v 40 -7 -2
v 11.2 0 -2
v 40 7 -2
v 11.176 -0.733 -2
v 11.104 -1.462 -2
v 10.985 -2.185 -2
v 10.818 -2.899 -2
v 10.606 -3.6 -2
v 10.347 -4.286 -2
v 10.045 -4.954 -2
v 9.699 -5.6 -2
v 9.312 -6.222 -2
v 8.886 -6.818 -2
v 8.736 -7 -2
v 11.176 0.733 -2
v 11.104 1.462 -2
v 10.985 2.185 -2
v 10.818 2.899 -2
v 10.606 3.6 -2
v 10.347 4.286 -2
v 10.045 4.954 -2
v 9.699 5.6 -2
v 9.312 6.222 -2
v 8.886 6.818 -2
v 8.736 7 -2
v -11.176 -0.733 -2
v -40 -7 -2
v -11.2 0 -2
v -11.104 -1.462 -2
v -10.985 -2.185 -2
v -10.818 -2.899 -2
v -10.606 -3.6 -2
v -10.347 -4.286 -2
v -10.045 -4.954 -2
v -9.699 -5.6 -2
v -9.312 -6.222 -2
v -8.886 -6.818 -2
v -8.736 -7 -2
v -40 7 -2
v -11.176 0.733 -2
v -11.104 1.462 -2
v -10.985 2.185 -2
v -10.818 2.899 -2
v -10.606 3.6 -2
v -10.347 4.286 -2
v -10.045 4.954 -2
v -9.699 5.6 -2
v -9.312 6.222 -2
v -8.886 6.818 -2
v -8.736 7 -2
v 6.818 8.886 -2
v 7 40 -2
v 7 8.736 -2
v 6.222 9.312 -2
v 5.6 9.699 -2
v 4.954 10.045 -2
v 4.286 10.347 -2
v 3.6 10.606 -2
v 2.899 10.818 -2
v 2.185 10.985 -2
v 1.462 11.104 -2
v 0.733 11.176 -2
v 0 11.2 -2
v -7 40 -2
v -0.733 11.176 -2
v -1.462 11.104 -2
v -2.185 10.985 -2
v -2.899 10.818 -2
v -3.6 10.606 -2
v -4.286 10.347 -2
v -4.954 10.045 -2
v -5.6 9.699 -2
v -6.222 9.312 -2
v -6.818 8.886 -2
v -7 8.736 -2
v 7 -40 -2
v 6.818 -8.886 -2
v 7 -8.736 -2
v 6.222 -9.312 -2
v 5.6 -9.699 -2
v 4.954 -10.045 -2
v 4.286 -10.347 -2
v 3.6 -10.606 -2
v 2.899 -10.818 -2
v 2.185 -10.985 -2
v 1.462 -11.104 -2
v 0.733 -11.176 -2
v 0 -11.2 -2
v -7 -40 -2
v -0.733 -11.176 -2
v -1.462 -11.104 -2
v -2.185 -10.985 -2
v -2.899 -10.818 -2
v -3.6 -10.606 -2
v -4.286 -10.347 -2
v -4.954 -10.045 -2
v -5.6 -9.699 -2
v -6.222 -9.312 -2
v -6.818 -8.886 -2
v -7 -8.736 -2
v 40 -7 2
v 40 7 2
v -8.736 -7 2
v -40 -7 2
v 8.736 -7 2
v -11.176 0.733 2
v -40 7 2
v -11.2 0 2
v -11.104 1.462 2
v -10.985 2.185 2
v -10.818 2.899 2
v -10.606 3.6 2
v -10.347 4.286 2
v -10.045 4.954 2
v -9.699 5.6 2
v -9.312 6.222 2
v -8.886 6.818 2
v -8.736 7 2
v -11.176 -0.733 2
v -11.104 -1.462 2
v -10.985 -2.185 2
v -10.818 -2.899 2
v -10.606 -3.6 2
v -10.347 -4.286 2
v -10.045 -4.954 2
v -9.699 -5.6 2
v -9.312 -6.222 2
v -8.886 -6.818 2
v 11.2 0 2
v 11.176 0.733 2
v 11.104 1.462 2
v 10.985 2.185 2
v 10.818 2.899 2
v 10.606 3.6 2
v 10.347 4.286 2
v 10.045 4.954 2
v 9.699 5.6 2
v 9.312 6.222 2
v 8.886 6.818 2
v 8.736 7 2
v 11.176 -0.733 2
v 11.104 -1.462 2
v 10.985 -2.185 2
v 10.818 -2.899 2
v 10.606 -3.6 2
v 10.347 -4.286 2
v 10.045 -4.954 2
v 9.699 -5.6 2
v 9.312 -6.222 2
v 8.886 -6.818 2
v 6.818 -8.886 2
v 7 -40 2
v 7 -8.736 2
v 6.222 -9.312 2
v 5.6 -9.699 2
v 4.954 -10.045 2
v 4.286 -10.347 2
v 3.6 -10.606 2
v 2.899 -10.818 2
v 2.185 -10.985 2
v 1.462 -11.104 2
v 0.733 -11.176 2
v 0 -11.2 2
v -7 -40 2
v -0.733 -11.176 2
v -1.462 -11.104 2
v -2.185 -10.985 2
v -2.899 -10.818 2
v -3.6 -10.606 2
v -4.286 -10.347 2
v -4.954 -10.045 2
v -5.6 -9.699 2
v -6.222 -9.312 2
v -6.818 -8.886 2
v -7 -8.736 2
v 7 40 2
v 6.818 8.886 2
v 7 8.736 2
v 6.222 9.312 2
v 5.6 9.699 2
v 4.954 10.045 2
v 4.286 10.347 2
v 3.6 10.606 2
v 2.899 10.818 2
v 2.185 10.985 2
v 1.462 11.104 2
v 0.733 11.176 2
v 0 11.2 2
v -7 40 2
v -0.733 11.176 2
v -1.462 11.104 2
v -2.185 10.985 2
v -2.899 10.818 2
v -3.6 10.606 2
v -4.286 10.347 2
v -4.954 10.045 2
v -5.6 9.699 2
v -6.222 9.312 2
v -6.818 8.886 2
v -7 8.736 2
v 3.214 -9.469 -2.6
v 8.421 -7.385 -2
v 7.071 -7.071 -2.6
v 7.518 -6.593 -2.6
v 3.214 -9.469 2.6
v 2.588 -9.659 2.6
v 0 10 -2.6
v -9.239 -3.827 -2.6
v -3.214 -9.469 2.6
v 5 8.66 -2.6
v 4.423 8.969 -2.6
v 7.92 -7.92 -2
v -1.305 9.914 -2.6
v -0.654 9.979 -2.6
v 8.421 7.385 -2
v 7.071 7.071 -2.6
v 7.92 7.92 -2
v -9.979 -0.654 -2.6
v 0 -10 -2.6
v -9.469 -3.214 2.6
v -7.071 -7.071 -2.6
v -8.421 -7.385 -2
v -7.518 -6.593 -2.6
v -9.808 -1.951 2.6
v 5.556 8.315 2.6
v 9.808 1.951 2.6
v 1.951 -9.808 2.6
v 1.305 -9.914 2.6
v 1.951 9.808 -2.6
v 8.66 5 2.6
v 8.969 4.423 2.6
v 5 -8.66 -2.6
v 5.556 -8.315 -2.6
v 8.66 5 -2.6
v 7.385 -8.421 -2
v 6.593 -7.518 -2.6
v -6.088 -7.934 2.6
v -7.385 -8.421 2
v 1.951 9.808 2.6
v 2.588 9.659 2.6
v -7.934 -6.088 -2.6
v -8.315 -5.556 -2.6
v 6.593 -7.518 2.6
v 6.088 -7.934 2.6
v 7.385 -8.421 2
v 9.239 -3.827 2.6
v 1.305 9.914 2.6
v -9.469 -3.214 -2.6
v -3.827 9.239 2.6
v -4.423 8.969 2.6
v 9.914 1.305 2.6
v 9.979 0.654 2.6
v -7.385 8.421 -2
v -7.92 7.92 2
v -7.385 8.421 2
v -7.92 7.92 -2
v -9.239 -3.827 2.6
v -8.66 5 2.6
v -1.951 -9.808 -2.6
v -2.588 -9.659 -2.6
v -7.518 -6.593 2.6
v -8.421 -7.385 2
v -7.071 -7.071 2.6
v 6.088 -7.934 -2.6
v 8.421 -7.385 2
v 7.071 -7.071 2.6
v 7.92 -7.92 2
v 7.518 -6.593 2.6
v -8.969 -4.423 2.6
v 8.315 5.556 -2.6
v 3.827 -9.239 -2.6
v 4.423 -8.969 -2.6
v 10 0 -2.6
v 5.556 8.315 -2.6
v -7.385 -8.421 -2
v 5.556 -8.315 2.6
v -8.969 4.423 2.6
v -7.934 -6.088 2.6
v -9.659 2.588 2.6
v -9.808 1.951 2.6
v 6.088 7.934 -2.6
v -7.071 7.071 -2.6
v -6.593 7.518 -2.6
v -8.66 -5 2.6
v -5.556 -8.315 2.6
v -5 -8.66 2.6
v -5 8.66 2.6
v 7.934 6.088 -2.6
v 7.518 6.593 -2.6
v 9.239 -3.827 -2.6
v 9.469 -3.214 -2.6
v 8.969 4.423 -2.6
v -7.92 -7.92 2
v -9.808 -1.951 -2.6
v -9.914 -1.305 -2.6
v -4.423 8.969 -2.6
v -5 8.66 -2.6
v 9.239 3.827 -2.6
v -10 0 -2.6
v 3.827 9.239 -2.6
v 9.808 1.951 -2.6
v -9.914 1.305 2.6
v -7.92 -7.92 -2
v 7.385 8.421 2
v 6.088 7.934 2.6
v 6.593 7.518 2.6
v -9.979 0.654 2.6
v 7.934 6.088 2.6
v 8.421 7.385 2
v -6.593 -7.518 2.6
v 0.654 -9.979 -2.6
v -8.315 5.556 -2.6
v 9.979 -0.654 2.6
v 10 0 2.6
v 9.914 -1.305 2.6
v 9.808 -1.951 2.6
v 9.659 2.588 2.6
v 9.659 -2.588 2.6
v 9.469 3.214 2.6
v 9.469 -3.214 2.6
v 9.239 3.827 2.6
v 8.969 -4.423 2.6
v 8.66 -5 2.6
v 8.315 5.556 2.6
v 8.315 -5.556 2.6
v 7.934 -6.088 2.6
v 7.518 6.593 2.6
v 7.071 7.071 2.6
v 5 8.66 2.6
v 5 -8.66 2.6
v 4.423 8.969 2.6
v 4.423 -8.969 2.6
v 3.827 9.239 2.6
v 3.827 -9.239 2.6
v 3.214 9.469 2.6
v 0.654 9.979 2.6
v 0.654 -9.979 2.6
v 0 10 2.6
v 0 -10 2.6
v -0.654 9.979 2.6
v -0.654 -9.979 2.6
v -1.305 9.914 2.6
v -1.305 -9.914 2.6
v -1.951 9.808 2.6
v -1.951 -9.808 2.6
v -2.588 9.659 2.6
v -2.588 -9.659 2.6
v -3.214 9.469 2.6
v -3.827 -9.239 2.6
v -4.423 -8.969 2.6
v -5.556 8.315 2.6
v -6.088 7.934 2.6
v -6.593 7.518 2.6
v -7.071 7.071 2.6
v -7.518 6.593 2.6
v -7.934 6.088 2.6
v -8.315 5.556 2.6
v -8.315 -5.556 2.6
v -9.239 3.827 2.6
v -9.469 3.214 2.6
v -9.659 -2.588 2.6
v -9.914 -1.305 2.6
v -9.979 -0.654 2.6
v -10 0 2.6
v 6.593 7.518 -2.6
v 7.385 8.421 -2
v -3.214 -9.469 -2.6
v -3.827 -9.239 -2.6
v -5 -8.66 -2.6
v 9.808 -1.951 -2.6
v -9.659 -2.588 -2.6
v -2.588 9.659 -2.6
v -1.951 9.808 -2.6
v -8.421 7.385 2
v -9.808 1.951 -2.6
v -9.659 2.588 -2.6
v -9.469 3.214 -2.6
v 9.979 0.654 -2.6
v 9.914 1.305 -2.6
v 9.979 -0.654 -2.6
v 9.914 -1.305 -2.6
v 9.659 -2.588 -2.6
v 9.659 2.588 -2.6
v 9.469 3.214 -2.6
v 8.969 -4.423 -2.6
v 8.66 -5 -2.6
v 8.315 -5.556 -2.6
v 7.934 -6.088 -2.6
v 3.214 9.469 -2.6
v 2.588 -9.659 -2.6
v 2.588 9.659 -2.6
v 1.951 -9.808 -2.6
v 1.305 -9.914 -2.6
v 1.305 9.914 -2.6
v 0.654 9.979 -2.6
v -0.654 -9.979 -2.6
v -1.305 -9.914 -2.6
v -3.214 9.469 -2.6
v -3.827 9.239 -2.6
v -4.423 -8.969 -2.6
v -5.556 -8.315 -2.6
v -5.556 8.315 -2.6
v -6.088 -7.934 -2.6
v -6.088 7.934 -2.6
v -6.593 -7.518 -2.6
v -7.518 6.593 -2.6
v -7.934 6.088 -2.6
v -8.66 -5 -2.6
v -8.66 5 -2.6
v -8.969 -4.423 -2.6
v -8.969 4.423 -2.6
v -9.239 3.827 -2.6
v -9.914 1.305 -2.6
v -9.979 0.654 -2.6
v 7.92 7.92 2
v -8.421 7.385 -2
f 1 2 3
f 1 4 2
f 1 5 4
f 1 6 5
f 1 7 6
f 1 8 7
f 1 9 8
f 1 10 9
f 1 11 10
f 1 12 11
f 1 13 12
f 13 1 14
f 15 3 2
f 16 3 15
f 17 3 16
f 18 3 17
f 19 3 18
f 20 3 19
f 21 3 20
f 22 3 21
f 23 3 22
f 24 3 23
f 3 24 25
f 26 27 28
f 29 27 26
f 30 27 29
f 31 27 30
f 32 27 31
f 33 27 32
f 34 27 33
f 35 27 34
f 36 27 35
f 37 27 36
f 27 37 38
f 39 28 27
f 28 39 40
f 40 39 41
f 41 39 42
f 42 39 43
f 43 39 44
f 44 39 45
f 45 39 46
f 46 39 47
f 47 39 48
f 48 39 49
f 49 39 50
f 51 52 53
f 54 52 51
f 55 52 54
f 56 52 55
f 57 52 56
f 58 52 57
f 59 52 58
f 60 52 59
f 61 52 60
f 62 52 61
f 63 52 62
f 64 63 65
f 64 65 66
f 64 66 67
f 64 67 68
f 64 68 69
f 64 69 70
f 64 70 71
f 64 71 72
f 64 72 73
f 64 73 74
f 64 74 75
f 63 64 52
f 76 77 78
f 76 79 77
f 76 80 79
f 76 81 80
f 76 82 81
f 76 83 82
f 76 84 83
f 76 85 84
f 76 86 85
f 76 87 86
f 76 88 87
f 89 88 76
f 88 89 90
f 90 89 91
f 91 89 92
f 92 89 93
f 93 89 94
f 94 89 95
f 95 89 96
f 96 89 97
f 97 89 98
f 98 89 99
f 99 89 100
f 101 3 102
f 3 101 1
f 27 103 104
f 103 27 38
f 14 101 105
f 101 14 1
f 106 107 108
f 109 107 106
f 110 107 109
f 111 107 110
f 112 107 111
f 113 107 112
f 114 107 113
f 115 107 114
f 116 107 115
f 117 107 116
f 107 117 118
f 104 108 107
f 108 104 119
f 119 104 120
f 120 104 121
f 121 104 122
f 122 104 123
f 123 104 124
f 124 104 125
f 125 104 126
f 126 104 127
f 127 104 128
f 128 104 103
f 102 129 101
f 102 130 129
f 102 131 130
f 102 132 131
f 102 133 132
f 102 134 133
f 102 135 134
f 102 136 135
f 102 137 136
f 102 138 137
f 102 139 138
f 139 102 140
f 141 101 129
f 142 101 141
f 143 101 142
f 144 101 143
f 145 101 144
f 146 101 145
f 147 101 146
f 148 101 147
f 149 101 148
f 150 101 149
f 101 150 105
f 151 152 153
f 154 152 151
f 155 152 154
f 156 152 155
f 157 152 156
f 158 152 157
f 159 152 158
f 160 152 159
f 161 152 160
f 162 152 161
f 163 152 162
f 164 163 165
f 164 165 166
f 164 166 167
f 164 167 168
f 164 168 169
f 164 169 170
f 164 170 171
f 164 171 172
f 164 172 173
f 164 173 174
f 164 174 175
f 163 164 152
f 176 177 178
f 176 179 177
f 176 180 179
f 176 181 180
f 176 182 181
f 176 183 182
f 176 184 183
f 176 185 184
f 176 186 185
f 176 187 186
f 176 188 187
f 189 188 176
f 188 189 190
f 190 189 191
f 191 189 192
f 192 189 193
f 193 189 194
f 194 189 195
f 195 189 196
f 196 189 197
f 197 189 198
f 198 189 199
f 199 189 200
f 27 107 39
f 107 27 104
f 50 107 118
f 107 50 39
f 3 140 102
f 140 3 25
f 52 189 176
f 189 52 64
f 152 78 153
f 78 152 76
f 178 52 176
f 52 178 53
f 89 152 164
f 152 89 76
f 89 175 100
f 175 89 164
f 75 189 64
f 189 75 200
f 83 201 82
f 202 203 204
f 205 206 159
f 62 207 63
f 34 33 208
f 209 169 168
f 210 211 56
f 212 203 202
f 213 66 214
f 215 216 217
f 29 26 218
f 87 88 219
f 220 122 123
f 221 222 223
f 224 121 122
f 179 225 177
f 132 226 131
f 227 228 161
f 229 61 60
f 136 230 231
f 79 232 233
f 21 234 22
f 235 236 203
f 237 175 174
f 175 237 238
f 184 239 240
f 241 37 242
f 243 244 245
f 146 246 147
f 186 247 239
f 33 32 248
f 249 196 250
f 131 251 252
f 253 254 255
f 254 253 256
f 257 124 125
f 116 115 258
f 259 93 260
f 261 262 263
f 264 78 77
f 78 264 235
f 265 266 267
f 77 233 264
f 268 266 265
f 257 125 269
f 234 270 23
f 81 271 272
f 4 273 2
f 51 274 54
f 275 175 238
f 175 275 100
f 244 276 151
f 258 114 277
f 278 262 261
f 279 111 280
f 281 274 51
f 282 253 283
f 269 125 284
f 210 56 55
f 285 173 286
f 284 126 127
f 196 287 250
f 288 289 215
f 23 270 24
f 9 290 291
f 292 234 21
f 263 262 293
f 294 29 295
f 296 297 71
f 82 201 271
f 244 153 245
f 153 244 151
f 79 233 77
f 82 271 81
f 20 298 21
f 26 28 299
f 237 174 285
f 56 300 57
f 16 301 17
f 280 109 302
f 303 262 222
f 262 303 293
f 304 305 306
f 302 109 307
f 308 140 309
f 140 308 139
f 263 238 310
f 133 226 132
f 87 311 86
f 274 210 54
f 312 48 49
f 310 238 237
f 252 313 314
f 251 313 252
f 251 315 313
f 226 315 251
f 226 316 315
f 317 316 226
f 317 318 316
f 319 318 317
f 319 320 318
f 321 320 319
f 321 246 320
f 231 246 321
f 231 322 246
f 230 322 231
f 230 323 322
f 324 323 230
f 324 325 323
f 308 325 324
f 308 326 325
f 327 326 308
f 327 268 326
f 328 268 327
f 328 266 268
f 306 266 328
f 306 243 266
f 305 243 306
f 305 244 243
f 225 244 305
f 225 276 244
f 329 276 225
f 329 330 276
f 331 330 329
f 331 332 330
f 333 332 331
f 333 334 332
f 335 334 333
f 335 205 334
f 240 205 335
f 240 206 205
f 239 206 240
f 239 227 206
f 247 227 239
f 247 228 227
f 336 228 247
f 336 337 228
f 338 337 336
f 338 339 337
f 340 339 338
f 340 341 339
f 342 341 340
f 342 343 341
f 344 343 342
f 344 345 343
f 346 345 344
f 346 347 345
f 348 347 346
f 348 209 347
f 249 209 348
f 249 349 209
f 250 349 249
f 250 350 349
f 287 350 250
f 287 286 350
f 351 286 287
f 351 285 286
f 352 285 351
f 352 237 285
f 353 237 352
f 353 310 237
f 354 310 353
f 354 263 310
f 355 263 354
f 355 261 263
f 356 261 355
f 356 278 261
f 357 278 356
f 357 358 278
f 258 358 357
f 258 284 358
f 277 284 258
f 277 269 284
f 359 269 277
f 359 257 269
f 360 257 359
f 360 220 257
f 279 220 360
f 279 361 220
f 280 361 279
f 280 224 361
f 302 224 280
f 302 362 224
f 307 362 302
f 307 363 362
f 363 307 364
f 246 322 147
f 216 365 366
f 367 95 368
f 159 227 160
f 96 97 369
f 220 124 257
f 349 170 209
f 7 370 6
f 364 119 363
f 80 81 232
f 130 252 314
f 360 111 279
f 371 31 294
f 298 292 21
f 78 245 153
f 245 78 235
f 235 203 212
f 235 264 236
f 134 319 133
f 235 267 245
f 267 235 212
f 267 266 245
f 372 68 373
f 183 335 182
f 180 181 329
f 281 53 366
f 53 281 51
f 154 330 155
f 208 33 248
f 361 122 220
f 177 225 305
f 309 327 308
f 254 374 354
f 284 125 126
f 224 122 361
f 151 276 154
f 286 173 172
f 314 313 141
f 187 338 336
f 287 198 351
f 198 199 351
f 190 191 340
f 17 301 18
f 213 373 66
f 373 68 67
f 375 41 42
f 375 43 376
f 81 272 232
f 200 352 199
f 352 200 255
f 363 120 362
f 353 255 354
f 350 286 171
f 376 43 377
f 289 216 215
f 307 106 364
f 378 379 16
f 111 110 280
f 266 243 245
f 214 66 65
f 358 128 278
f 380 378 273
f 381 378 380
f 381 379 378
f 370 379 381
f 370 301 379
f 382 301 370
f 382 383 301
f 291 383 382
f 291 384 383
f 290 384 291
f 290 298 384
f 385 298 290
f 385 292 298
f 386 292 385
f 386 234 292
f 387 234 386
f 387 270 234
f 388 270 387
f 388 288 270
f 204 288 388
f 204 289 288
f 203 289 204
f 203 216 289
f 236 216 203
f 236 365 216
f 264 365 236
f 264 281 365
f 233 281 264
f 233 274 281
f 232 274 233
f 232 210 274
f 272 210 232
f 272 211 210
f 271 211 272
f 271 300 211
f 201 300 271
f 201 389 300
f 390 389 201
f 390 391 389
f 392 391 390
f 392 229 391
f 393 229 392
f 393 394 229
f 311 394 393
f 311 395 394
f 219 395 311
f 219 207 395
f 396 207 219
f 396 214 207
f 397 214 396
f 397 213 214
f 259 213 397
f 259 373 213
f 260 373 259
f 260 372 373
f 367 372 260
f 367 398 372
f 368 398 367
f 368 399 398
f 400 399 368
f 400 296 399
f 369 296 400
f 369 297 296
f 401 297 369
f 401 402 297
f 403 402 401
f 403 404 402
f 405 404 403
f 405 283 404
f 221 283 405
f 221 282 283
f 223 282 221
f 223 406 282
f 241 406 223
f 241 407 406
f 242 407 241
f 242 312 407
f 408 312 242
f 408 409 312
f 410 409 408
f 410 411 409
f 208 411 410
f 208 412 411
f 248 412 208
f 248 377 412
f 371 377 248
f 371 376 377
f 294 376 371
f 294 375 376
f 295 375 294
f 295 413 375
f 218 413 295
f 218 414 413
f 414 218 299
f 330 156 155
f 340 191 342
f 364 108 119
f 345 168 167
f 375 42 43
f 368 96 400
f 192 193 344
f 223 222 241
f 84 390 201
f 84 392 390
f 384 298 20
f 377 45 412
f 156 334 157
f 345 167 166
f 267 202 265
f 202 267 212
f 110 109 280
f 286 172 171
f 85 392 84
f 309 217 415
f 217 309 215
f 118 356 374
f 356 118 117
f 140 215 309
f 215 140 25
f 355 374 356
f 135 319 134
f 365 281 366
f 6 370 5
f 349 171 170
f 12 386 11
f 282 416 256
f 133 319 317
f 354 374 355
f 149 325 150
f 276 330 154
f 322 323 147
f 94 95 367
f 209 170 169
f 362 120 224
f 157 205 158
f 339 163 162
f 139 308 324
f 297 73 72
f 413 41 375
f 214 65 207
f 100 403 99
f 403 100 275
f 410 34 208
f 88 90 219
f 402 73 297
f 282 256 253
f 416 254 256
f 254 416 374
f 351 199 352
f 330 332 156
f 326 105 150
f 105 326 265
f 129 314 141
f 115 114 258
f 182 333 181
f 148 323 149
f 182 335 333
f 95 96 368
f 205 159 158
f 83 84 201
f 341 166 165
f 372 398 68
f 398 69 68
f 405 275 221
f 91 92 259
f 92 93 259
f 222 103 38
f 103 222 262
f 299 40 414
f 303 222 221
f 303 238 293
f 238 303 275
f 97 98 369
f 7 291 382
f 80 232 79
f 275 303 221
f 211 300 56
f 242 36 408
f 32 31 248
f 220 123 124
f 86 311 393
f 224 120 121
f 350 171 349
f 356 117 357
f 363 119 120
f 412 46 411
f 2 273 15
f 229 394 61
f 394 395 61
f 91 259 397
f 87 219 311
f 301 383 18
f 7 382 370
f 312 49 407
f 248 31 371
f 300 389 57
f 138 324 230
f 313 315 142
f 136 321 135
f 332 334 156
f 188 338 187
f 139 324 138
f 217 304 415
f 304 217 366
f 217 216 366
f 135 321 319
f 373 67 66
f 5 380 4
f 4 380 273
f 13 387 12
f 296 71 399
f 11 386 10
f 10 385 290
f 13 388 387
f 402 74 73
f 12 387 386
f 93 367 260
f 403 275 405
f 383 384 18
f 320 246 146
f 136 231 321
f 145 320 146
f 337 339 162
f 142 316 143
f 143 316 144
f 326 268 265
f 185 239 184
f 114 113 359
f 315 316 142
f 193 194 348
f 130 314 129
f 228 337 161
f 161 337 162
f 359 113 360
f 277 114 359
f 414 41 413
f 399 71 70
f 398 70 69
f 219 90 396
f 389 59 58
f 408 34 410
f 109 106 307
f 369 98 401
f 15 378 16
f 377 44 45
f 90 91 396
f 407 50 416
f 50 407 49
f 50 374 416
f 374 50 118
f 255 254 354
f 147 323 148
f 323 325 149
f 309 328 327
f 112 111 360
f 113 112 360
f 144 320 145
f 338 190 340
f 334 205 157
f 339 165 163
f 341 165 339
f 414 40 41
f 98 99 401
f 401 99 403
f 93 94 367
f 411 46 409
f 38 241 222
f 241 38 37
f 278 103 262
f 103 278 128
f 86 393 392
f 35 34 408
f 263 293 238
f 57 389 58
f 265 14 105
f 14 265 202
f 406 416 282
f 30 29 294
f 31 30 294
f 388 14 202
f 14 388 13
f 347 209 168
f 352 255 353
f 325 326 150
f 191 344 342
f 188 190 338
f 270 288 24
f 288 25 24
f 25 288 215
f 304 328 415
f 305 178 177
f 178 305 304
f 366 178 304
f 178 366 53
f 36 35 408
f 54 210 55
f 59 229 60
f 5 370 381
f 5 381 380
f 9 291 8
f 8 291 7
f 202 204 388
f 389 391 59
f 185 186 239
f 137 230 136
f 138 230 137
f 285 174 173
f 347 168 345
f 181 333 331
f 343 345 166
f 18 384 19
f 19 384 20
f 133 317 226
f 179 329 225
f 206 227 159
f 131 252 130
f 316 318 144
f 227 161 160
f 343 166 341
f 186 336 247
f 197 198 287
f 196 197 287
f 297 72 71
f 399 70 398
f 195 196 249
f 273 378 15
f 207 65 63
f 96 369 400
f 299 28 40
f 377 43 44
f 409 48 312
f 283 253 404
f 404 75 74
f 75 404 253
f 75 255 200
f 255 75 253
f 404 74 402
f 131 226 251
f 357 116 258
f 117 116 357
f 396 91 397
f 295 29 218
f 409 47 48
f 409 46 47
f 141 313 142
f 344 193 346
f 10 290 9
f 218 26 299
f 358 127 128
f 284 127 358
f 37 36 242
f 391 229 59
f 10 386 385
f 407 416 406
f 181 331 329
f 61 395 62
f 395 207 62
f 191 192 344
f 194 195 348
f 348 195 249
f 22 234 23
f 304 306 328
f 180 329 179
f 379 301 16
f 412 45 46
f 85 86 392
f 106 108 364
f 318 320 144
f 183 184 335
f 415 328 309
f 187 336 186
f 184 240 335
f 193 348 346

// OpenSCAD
$fn=96;

arm_len = 40;
arm_w   = 14;
thk     = 4;

chamfer = 1.0;

center_r = 10;
center_thk = 5.2;

module chamfered_bar(len, w, h, c){
    linear_extrude(height=h, center=true)
        offset(delta=-c)
            offset(delta=c)
                square([len, w], center=true);
}

module cross_arms(){
    union(){
        chamfered_bar(2*arm_len, arm_w, thk, chamfer);
        rotate([0,0,90]) chamfered_bar(2*arm_len, arm_w, thk, chamfer);
    }
}

module center_boss(){
    hull(){
        cylinder(h=center_thk, r=center_r, center=true);
        cylinder(h=thk, r=center_r+1.2, center=true);
    }
}

union(){
    cross_arms();
    center_boss();
}
